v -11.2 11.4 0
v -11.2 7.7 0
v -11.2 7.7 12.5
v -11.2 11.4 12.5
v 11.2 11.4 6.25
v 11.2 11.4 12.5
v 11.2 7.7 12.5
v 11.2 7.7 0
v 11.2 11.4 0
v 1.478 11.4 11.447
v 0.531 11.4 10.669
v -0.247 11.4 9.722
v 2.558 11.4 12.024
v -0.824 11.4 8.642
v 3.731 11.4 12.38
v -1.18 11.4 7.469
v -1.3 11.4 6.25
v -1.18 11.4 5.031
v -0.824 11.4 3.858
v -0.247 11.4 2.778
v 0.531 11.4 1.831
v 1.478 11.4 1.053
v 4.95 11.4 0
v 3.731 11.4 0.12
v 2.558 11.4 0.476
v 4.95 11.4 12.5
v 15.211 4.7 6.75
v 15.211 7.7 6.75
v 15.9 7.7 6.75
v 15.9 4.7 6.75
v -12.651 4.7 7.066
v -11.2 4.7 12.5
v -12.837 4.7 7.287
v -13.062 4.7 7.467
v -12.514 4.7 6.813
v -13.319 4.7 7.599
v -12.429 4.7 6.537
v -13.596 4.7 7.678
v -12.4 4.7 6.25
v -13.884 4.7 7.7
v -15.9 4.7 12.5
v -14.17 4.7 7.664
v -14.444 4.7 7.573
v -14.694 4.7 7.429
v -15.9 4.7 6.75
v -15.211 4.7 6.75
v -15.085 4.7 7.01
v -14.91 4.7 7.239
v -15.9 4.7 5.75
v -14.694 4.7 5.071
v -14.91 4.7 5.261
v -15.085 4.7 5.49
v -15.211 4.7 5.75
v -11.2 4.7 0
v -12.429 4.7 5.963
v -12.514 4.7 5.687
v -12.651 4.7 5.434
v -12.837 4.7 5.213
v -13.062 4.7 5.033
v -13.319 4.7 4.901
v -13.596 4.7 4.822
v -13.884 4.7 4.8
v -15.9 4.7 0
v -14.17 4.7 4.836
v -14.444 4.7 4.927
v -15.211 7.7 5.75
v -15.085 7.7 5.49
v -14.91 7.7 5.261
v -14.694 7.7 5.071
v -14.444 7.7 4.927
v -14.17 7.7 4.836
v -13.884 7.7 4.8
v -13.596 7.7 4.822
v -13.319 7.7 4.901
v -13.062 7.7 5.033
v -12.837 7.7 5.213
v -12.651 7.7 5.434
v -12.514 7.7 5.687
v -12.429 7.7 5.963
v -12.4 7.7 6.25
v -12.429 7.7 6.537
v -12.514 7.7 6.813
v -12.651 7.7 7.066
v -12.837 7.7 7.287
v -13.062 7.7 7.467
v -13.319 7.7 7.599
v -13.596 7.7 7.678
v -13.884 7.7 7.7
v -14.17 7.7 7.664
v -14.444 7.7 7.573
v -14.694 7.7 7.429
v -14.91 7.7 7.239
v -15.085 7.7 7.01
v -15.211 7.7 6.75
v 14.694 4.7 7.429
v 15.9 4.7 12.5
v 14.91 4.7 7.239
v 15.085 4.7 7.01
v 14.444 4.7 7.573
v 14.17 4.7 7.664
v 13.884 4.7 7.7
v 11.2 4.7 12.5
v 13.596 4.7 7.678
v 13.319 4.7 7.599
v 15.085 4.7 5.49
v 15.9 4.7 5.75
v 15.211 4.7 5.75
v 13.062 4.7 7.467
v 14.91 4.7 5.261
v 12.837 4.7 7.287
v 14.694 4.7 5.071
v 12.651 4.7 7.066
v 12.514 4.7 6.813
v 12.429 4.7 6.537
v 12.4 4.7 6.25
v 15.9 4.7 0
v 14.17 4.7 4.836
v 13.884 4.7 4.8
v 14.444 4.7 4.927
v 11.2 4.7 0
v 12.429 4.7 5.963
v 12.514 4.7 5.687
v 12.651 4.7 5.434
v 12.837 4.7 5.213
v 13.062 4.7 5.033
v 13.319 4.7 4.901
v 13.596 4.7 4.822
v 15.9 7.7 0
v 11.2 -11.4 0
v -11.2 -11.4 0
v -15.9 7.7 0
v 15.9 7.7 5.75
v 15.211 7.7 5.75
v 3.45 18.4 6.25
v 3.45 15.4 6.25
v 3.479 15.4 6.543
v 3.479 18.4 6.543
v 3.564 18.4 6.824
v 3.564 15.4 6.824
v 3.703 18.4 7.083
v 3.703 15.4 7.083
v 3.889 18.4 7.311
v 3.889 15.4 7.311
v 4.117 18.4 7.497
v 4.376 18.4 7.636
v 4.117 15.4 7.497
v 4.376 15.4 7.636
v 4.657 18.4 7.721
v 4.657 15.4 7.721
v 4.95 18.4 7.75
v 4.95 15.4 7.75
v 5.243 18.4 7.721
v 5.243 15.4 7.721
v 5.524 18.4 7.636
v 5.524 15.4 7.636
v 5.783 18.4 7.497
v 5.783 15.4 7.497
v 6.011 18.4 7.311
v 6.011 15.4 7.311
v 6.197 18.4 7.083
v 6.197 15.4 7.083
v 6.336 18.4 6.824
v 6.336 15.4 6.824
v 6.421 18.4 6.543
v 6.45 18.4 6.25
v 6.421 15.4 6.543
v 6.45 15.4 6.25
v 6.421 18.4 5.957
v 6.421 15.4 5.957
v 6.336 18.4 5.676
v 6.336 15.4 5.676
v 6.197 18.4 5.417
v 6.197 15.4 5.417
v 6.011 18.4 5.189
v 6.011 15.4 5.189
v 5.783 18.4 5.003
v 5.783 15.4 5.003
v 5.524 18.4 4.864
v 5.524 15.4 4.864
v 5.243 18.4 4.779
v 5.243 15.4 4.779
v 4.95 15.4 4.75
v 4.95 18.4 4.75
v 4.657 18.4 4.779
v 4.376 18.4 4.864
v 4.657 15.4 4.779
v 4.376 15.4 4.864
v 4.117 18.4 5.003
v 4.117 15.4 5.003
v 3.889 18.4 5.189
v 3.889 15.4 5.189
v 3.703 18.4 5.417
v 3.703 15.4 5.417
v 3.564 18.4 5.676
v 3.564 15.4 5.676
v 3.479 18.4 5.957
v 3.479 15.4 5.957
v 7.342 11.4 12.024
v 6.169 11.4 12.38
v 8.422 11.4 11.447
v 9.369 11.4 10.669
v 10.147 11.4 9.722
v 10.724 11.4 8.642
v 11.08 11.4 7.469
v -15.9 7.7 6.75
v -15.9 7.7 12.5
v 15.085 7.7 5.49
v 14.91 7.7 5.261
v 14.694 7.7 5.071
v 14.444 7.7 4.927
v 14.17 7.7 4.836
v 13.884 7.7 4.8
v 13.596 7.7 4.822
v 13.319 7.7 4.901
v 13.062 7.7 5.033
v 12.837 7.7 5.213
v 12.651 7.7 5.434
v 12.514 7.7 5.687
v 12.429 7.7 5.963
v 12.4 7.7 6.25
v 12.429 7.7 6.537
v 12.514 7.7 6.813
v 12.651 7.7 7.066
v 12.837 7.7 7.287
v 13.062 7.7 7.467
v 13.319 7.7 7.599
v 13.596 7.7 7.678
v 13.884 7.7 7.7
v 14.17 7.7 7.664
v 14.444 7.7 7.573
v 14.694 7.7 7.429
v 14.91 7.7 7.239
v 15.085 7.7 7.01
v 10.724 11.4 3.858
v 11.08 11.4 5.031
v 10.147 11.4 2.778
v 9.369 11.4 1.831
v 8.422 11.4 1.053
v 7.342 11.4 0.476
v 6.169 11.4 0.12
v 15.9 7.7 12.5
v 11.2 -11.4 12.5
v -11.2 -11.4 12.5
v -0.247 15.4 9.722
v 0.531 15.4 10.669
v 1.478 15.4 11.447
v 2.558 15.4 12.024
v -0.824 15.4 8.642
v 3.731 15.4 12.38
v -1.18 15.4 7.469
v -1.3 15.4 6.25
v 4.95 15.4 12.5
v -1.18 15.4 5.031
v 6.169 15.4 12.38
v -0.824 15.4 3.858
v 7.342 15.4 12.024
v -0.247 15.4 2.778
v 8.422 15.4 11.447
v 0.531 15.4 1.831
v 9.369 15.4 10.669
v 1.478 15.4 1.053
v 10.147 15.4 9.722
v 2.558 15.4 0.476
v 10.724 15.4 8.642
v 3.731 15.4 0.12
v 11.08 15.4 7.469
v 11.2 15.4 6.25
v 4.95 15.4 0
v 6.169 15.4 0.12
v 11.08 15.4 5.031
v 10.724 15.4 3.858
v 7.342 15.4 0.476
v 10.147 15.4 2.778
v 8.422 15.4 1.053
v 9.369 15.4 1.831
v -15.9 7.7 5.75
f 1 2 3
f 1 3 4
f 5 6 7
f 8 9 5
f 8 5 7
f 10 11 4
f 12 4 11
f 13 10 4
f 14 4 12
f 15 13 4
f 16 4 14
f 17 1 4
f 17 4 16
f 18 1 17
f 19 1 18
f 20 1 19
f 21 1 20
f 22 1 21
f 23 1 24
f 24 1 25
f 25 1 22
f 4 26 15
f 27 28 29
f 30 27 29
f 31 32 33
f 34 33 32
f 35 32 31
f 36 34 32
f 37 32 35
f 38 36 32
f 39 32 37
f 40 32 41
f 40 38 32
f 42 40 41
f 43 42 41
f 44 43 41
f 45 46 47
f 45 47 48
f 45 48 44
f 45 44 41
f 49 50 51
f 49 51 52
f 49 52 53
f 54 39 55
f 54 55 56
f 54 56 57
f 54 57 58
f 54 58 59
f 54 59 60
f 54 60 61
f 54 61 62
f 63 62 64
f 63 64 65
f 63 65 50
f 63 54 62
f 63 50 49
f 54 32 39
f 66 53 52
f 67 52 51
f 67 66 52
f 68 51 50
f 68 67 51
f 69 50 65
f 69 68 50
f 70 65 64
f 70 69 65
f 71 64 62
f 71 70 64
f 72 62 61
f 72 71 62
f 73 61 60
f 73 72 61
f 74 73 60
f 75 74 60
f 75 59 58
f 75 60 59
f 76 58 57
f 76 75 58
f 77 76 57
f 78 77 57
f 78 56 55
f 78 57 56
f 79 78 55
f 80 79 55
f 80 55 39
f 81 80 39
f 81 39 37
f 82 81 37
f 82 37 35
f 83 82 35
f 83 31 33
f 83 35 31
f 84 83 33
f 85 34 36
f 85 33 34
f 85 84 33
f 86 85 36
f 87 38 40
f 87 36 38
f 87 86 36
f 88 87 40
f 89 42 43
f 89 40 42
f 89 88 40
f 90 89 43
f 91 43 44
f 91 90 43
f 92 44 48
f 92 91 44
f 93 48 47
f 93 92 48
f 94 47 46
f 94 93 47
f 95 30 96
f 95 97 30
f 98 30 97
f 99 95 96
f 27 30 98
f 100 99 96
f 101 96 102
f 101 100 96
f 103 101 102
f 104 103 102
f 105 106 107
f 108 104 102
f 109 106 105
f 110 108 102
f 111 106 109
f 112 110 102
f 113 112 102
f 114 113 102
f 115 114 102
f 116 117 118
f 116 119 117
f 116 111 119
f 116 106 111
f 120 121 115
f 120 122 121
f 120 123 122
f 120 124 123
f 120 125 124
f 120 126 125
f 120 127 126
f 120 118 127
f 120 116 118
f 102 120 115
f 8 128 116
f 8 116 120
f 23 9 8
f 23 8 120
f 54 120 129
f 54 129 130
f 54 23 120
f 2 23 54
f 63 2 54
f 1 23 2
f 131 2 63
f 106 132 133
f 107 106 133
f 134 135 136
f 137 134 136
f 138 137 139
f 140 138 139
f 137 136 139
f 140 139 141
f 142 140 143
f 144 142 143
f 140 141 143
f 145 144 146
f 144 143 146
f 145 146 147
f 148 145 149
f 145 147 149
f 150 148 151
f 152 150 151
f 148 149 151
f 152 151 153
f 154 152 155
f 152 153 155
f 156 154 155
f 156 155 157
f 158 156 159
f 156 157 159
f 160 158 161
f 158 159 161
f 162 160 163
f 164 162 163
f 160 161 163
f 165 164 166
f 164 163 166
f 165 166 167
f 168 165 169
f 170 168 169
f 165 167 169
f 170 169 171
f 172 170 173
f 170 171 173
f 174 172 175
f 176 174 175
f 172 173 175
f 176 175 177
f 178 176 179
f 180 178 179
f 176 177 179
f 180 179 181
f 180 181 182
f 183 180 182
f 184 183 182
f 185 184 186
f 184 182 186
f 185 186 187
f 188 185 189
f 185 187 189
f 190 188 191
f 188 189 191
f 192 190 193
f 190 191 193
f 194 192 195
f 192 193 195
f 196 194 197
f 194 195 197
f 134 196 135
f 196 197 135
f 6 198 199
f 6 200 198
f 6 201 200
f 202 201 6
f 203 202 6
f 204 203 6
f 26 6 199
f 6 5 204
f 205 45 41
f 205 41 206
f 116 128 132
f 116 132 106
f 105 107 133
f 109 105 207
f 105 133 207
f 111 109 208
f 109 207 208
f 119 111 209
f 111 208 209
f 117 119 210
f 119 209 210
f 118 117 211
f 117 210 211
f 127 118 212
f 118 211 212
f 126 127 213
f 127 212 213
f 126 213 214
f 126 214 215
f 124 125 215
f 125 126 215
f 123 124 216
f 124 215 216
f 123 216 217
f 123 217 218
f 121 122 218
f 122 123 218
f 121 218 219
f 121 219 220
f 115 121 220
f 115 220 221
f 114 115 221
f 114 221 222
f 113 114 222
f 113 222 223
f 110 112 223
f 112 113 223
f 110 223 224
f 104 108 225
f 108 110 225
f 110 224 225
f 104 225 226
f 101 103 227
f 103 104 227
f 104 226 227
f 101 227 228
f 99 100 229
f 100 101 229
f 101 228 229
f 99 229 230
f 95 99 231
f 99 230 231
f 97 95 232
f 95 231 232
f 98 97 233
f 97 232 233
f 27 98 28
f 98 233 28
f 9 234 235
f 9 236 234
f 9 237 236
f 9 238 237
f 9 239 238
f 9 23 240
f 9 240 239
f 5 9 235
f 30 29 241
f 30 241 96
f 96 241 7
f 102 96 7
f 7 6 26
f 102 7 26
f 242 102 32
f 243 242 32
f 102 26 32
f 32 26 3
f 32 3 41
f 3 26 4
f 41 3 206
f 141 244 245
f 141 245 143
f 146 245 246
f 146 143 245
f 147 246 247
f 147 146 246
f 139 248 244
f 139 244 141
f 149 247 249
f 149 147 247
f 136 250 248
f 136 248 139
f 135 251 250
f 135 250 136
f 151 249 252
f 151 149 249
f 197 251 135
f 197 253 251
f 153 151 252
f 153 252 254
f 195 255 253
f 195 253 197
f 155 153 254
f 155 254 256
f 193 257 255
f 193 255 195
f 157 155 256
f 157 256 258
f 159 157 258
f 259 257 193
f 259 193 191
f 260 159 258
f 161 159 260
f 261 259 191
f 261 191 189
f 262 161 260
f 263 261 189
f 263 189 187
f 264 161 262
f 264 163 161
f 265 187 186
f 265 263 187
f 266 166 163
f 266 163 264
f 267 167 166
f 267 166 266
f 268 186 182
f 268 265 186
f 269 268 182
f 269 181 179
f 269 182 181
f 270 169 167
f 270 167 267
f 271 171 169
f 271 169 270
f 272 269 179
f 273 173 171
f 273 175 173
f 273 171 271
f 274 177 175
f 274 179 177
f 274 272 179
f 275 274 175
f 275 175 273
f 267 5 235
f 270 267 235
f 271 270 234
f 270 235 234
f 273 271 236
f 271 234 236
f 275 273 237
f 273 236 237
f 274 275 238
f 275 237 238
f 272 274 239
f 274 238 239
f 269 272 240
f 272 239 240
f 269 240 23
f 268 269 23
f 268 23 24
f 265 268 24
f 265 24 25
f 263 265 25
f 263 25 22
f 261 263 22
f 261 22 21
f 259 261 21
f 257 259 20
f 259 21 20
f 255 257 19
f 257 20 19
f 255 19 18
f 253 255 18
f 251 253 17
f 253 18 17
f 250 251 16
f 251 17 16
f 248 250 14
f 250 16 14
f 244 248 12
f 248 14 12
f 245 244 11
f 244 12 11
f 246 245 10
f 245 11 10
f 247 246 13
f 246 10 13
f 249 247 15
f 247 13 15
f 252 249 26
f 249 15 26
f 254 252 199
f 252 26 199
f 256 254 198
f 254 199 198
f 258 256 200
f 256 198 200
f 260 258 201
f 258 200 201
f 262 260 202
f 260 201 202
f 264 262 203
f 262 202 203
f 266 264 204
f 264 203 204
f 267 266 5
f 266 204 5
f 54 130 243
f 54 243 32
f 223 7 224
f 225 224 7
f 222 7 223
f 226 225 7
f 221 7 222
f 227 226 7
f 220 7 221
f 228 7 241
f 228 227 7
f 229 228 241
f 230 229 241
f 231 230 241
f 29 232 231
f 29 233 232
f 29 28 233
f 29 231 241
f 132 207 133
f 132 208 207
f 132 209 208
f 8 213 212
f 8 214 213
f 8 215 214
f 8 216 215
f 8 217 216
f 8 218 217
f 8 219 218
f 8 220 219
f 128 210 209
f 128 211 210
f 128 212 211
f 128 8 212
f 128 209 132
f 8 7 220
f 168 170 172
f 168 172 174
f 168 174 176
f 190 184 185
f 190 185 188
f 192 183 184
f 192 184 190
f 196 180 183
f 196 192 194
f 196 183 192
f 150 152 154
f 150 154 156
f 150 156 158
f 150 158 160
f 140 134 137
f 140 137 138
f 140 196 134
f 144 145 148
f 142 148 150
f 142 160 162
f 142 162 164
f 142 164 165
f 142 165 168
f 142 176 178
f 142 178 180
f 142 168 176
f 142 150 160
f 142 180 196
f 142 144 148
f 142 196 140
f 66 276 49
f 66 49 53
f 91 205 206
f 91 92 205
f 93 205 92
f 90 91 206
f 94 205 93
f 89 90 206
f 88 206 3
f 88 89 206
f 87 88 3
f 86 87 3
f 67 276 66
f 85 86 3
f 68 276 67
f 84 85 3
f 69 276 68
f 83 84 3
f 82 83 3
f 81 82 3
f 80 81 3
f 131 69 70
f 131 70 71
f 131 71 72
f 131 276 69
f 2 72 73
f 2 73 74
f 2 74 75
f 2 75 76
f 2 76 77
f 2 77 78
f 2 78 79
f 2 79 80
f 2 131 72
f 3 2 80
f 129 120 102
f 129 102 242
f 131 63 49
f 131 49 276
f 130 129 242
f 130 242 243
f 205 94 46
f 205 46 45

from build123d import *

# Parameters (mm, degrees)
EXTRUDE_1_DEPTH     = 12.5
CUT_EXTRUDE_2_REACH = 29.819
SKETCH_6_R          = 6.25
EXTRUDE_2_DEPTH     = 4
SKETCH_7_R          = 1.5
EXTRUDE_3_DEPTH     = 3


with BuildPart() as part:
    # 草图1 → 凸台-拉伸1 (new body)
    with BuildSketch(Plane.XY):
        Polygon((-11.2, 11.4), (11.2, 11.4), (11.2, 7.7), (15.9, 7.7), (15.9, 4.7), (11.2, 4.7), (11.2, -11.4), (-11.2, -11.4), (-11.2, 4.7), (-15.9, 4.7), (-15.9, 7.7), (-11.2, 7.7), align=None)
    extrude(amount=EXTRUDE_1_DEPTH)

    # 草图5 → 切除-拉伸2 (cut, up to next)
    with BuildSketch(Plane(origin=(0, 7.7, 0), x_dir=(1, 0, 0), z_dir=(0, 1, 0)), mode=Mode.PRIVATE) as cut_extrude_2_sk1:
        with BuildLine():
            Line((-15.211065759, -6.75), (-15.9, -6.75))
            Line((-15.9, -6.75), (-15.9, -5.75))
            Line((-15.9, -5.75), (-15.211065759, -5.75))
            ThreePointArc((-15.211065759, -5.75), (-12.4, -6.25), (-15.211065759, -6.75))
        make_face()
    cut_extrude_2_tool1 = extrude(cut_extrude_2_sk1.sketch, amount=-CUT_EXTRUDE_2_REACH, mode=Mode.PRIVATE) & part.part
    cut_extrude_2 = cut_extrude_2_tool1.solids().sort_by_distance((-14.000898, 7.7, 6.25))[0]
    add(cut_extrude_2, mode=Mode.SUBTRACT)

    # 镜向2: 切除-拉伸2 across plane
    add(cut_extrude_2.mirror(Plane(origin=(0, 0, 0), x_dir=(0, 0, 1), z_dir=(1, 0, 0))), mode=Mode.SUBTRACT)

    # 草图6 → 凸台-拉伸2 (add)
    with BuildSketch(Plane(origin=(0, 11.4, 0), x_dir=(1, 0, 0), z_dir=(0, 1, 0))):
        with Locations((4.95, -6.25)):
            Circle(SKETCH_6_R)
    extrude(amount=EXTRUDE_2_DEPTH)

    # 草图7 → 凸台-拉伸3 (add)
    with BuildSketch(Plane(origin=(0, 15.4, 0), x_dir=(1, 0, 0), z_dir=(0, 1, 0))):
        with Locations(Location((4.95, -6.25, 0), (0, 0, 180))):
            Circle(SKETCH_7_R)
    extrude(amount=EXTRUDE_3_DEPTH)


solid = part.part
